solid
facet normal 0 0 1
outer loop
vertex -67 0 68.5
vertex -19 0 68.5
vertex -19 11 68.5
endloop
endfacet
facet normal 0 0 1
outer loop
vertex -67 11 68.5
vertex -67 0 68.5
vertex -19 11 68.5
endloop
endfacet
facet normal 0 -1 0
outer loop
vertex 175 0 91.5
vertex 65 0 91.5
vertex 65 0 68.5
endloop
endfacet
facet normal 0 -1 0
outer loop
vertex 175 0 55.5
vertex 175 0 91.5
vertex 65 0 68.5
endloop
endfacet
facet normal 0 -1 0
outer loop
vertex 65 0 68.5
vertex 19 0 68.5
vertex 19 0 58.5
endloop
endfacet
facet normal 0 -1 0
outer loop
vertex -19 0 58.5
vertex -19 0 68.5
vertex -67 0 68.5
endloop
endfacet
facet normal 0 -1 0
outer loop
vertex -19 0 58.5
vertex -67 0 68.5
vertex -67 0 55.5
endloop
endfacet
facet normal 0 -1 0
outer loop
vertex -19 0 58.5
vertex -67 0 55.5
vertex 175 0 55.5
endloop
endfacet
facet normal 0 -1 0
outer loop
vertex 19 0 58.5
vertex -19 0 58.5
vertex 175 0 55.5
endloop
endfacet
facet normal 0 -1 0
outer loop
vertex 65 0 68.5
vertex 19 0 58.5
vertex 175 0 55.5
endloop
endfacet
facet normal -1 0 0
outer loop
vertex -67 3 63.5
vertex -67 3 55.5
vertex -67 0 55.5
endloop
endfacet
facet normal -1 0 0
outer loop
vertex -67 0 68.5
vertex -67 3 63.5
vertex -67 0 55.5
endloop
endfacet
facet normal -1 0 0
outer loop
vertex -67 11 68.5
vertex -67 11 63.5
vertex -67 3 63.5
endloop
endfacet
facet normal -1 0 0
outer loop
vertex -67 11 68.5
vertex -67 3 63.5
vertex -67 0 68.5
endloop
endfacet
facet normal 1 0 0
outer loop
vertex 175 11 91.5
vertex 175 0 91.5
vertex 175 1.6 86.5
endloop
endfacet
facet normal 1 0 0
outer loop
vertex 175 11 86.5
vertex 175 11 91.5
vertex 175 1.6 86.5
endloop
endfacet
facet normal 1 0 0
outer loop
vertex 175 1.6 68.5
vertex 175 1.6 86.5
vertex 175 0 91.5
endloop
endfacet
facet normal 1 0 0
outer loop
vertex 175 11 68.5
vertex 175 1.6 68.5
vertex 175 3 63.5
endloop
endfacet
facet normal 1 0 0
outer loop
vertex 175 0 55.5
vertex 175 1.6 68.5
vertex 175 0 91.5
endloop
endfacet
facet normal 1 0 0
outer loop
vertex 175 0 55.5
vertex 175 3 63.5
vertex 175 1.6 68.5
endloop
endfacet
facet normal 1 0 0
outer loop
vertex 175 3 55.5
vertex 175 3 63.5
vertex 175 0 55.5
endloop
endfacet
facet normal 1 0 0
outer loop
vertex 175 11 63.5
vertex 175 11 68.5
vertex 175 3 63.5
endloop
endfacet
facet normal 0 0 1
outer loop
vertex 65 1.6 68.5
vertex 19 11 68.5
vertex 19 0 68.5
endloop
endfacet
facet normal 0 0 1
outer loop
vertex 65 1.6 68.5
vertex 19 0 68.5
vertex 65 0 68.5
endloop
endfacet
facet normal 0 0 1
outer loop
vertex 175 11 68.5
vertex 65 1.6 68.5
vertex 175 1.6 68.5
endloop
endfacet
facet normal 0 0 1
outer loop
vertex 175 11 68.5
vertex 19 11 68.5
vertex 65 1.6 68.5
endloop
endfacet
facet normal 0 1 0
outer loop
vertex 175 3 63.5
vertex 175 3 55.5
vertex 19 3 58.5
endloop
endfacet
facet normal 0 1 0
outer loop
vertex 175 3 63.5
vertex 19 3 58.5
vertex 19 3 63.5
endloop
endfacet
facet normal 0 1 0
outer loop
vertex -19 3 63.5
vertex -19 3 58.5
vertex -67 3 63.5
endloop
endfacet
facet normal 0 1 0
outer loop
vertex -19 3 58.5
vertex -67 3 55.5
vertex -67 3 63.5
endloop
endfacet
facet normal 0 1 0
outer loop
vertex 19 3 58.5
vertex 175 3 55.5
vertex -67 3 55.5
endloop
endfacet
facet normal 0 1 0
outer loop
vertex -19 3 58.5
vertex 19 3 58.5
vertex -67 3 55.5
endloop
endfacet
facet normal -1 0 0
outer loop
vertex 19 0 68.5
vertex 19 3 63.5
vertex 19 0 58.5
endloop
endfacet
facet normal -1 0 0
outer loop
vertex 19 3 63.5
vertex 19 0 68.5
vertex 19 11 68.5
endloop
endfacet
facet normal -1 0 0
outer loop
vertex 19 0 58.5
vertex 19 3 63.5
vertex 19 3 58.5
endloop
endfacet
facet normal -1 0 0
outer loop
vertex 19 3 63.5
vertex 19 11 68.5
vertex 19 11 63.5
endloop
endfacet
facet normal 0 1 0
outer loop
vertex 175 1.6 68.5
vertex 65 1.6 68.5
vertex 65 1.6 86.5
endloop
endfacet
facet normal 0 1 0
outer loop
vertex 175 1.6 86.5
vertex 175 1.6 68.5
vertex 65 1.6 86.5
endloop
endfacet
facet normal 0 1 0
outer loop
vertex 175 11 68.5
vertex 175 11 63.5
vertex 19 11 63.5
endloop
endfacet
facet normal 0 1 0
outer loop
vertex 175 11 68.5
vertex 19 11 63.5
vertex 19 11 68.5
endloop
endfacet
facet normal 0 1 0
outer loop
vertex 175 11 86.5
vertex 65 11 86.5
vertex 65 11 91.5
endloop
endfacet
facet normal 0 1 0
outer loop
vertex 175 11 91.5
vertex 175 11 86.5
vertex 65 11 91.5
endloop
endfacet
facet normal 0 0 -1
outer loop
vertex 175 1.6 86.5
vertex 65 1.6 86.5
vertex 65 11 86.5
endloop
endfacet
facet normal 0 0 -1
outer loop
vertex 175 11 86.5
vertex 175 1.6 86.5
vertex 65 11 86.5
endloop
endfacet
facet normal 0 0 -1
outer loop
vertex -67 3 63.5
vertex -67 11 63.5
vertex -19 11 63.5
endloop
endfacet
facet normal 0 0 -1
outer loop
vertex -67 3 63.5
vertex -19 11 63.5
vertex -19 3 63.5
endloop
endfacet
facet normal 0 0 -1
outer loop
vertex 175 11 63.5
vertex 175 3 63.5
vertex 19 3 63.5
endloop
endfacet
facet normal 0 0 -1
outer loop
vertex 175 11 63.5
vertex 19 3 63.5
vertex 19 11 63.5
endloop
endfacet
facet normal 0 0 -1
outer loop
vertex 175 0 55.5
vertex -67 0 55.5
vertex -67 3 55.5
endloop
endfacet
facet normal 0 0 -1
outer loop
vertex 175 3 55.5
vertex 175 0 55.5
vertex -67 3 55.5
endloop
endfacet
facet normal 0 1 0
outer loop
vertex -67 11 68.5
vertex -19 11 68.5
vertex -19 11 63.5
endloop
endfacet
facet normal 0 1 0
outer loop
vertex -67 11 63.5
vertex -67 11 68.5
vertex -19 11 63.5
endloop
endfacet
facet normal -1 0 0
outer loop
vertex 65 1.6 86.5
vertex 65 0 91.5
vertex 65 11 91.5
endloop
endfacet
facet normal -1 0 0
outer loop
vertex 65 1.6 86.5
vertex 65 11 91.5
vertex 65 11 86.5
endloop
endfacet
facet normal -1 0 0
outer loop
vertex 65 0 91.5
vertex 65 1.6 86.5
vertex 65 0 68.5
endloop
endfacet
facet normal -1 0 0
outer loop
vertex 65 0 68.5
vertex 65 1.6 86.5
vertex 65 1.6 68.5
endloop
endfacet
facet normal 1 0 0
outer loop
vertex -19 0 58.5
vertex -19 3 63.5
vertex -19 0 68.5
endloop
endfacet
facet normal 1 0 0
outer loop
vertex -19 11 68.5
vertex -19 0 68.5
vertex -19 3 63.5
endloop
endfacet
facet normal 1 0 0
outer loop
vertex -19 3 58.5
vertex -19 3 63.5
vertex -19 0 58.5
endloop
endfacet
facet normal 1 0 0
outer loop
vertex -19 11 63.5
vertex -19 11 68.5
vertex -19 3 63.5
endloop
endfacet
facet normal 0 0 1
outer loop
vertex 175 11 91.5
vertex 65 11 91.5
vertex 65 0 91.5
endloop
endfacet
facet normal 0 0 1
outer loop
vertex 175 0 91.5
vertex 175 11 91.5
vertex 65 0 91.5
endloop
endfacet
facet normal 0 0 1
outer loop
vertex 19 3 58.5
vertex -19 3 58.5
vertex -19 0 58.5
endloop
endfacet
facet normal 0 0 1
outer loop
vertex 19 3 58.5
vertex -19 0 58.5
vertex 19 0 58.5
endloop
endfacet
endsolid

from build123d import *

# Parameters (mm, degrees)
SKETCH1_W               = 120
SKETCH1_H               = 137
BOSS_EXTRUDE1_DEPTH     = 3
SKETCH2_W               = 120
SKETCH2_H               = 5
BOSS_EXTRUDE2_DEPTH     = 8
SKETCH3_W               = 38
SKETCH3_H               = 10
CUT_EXTRUDE1_DEPTH      = 25
SKETCH4_W               = 120
SKETCH4_H               = 124
CUT_EXTRUDE2_DEPTH      = 92.412526494
CUT_EXTRUDE2_DEPTH_BACK = 92.412526494
BOSS_EXTRUDE3_DEPTH     = 7
BOSS_EXTRUDE4_DEPTH     = 120
SKETCH9_W               = 5
SKETCH9_H               = 23
CUT_EXTRUDE3_DEPTH      = 250
MOVE_FACE1_BY           = 5


with BuildPart() as part:
    # Sketch1 → Boss-Extrude1 (new body)
    with BuildSketch(Plane(origin=(0, 0, 0), x_dir=(1, 0, 0), z_dir=(0, 1, 0))):
        Rectangle(SKETCH1_W, SKETCH1_H)
    extrude(amount=BOSS_EXTRUDE1_DEPTH)

    # Sketch2 → Boss-Extrude2 (add)
    with BuildSketch(Plane(origin=(0, 3, 0), x_dir=(1, 0, 0), z_dir=(0, 1, 0))):
        with Locations((0, -66)):
            Rectangle(SKETCH2_W, SKETCH2_H)
    extrude(amount=BOSS_EXTRUDE2_DEPTH)

    # Sketch3 → Cut-Extrude1 (cut)
    with BuildSketch(Plane(origin=(0, 11, 0), x_dir=(1, 0, 0), z_dir=(0, 1, 0))):
        with Locations((0, -63.5)):
            Rectangle(SKETCH3_W, SKETCH3_H)
    extrude(amount=-CUT_EXTRUDE1_DEPTH, mode=Mode.SUBTRACT)

    # Sketch4 → Cut-Extrude2 (cut, two sides)
    with BuildSketch(Plane(origin=(0, 3, 0), x_dir=(1, 0, 0), z_dir=(0, 1, 0))) as cut_extrude2_sk:
        with Locations((0, 6.5)):
            Rectangle(SKETCH4_W, SKETCH4_H)
    extrude(amount=CUT_EXTRUDE2_DEPTH, mode=Mode.SUBTRACT)
    extrude(cut_extrude2_sk.sketch, amount=-CUT_EXTRUDE2_DEPTH_BACK, mode=Mode.SUBTRACT)

    # Sketch7 → Boss-Extrude3 (add)
    with BuildSketch(Plane.ZY.offset(60)):
        Polygon((63.5, 11), (63.5, 3), (55.5, 3), (55.5, 0), (68.5, 0), (68.5, 11), align=None)
    extrude(amount=BOSS_EXTRUDE3_DEPTH)

    # Sketch8 → Boss-Extrude4 (add)
    with BuildSketch(Plane(origin=(60, 0, 0), x_dir=(0, 0, -1), z_dir=(1, 0, 0))):
        Polygon((-55.5, 0), (-55.5, 3), (-63.5, 3), (-63.5, 11), (-68.5, 11), (-68.5, 1.6), (-86.5, 1.6), (-86.5, 11), (-91.5, 11), (-91.5, 0), align=None)
    extrude(amount=BOSS_EXTRUDE4_DEPTH)

    # Sketch9 → Cut-Extrude3 (cut)
    with BuildSketch(Plane(origin=(0, 11, 0), x_dir=(1, 0, 0), z_dir=(0, 1, 0))):
        with Locations((62.5, -80)):
            Rectangle(SKETCH9_W, SKETCH9_H)
    extrude(amount=-CUT_EXTRUDE3_DEPTH, mode=Mode.SUBTRACT)

    # Move Face1: a face moved inward by 5.0
    extrude(part.faces().sort_by_distance((180, 1.1, 73.5))[0], amount=MOVE_FACE1_BY, dir=(-1, 0, 0), mode=Mode.SUBTRACT)


solid = part.part
